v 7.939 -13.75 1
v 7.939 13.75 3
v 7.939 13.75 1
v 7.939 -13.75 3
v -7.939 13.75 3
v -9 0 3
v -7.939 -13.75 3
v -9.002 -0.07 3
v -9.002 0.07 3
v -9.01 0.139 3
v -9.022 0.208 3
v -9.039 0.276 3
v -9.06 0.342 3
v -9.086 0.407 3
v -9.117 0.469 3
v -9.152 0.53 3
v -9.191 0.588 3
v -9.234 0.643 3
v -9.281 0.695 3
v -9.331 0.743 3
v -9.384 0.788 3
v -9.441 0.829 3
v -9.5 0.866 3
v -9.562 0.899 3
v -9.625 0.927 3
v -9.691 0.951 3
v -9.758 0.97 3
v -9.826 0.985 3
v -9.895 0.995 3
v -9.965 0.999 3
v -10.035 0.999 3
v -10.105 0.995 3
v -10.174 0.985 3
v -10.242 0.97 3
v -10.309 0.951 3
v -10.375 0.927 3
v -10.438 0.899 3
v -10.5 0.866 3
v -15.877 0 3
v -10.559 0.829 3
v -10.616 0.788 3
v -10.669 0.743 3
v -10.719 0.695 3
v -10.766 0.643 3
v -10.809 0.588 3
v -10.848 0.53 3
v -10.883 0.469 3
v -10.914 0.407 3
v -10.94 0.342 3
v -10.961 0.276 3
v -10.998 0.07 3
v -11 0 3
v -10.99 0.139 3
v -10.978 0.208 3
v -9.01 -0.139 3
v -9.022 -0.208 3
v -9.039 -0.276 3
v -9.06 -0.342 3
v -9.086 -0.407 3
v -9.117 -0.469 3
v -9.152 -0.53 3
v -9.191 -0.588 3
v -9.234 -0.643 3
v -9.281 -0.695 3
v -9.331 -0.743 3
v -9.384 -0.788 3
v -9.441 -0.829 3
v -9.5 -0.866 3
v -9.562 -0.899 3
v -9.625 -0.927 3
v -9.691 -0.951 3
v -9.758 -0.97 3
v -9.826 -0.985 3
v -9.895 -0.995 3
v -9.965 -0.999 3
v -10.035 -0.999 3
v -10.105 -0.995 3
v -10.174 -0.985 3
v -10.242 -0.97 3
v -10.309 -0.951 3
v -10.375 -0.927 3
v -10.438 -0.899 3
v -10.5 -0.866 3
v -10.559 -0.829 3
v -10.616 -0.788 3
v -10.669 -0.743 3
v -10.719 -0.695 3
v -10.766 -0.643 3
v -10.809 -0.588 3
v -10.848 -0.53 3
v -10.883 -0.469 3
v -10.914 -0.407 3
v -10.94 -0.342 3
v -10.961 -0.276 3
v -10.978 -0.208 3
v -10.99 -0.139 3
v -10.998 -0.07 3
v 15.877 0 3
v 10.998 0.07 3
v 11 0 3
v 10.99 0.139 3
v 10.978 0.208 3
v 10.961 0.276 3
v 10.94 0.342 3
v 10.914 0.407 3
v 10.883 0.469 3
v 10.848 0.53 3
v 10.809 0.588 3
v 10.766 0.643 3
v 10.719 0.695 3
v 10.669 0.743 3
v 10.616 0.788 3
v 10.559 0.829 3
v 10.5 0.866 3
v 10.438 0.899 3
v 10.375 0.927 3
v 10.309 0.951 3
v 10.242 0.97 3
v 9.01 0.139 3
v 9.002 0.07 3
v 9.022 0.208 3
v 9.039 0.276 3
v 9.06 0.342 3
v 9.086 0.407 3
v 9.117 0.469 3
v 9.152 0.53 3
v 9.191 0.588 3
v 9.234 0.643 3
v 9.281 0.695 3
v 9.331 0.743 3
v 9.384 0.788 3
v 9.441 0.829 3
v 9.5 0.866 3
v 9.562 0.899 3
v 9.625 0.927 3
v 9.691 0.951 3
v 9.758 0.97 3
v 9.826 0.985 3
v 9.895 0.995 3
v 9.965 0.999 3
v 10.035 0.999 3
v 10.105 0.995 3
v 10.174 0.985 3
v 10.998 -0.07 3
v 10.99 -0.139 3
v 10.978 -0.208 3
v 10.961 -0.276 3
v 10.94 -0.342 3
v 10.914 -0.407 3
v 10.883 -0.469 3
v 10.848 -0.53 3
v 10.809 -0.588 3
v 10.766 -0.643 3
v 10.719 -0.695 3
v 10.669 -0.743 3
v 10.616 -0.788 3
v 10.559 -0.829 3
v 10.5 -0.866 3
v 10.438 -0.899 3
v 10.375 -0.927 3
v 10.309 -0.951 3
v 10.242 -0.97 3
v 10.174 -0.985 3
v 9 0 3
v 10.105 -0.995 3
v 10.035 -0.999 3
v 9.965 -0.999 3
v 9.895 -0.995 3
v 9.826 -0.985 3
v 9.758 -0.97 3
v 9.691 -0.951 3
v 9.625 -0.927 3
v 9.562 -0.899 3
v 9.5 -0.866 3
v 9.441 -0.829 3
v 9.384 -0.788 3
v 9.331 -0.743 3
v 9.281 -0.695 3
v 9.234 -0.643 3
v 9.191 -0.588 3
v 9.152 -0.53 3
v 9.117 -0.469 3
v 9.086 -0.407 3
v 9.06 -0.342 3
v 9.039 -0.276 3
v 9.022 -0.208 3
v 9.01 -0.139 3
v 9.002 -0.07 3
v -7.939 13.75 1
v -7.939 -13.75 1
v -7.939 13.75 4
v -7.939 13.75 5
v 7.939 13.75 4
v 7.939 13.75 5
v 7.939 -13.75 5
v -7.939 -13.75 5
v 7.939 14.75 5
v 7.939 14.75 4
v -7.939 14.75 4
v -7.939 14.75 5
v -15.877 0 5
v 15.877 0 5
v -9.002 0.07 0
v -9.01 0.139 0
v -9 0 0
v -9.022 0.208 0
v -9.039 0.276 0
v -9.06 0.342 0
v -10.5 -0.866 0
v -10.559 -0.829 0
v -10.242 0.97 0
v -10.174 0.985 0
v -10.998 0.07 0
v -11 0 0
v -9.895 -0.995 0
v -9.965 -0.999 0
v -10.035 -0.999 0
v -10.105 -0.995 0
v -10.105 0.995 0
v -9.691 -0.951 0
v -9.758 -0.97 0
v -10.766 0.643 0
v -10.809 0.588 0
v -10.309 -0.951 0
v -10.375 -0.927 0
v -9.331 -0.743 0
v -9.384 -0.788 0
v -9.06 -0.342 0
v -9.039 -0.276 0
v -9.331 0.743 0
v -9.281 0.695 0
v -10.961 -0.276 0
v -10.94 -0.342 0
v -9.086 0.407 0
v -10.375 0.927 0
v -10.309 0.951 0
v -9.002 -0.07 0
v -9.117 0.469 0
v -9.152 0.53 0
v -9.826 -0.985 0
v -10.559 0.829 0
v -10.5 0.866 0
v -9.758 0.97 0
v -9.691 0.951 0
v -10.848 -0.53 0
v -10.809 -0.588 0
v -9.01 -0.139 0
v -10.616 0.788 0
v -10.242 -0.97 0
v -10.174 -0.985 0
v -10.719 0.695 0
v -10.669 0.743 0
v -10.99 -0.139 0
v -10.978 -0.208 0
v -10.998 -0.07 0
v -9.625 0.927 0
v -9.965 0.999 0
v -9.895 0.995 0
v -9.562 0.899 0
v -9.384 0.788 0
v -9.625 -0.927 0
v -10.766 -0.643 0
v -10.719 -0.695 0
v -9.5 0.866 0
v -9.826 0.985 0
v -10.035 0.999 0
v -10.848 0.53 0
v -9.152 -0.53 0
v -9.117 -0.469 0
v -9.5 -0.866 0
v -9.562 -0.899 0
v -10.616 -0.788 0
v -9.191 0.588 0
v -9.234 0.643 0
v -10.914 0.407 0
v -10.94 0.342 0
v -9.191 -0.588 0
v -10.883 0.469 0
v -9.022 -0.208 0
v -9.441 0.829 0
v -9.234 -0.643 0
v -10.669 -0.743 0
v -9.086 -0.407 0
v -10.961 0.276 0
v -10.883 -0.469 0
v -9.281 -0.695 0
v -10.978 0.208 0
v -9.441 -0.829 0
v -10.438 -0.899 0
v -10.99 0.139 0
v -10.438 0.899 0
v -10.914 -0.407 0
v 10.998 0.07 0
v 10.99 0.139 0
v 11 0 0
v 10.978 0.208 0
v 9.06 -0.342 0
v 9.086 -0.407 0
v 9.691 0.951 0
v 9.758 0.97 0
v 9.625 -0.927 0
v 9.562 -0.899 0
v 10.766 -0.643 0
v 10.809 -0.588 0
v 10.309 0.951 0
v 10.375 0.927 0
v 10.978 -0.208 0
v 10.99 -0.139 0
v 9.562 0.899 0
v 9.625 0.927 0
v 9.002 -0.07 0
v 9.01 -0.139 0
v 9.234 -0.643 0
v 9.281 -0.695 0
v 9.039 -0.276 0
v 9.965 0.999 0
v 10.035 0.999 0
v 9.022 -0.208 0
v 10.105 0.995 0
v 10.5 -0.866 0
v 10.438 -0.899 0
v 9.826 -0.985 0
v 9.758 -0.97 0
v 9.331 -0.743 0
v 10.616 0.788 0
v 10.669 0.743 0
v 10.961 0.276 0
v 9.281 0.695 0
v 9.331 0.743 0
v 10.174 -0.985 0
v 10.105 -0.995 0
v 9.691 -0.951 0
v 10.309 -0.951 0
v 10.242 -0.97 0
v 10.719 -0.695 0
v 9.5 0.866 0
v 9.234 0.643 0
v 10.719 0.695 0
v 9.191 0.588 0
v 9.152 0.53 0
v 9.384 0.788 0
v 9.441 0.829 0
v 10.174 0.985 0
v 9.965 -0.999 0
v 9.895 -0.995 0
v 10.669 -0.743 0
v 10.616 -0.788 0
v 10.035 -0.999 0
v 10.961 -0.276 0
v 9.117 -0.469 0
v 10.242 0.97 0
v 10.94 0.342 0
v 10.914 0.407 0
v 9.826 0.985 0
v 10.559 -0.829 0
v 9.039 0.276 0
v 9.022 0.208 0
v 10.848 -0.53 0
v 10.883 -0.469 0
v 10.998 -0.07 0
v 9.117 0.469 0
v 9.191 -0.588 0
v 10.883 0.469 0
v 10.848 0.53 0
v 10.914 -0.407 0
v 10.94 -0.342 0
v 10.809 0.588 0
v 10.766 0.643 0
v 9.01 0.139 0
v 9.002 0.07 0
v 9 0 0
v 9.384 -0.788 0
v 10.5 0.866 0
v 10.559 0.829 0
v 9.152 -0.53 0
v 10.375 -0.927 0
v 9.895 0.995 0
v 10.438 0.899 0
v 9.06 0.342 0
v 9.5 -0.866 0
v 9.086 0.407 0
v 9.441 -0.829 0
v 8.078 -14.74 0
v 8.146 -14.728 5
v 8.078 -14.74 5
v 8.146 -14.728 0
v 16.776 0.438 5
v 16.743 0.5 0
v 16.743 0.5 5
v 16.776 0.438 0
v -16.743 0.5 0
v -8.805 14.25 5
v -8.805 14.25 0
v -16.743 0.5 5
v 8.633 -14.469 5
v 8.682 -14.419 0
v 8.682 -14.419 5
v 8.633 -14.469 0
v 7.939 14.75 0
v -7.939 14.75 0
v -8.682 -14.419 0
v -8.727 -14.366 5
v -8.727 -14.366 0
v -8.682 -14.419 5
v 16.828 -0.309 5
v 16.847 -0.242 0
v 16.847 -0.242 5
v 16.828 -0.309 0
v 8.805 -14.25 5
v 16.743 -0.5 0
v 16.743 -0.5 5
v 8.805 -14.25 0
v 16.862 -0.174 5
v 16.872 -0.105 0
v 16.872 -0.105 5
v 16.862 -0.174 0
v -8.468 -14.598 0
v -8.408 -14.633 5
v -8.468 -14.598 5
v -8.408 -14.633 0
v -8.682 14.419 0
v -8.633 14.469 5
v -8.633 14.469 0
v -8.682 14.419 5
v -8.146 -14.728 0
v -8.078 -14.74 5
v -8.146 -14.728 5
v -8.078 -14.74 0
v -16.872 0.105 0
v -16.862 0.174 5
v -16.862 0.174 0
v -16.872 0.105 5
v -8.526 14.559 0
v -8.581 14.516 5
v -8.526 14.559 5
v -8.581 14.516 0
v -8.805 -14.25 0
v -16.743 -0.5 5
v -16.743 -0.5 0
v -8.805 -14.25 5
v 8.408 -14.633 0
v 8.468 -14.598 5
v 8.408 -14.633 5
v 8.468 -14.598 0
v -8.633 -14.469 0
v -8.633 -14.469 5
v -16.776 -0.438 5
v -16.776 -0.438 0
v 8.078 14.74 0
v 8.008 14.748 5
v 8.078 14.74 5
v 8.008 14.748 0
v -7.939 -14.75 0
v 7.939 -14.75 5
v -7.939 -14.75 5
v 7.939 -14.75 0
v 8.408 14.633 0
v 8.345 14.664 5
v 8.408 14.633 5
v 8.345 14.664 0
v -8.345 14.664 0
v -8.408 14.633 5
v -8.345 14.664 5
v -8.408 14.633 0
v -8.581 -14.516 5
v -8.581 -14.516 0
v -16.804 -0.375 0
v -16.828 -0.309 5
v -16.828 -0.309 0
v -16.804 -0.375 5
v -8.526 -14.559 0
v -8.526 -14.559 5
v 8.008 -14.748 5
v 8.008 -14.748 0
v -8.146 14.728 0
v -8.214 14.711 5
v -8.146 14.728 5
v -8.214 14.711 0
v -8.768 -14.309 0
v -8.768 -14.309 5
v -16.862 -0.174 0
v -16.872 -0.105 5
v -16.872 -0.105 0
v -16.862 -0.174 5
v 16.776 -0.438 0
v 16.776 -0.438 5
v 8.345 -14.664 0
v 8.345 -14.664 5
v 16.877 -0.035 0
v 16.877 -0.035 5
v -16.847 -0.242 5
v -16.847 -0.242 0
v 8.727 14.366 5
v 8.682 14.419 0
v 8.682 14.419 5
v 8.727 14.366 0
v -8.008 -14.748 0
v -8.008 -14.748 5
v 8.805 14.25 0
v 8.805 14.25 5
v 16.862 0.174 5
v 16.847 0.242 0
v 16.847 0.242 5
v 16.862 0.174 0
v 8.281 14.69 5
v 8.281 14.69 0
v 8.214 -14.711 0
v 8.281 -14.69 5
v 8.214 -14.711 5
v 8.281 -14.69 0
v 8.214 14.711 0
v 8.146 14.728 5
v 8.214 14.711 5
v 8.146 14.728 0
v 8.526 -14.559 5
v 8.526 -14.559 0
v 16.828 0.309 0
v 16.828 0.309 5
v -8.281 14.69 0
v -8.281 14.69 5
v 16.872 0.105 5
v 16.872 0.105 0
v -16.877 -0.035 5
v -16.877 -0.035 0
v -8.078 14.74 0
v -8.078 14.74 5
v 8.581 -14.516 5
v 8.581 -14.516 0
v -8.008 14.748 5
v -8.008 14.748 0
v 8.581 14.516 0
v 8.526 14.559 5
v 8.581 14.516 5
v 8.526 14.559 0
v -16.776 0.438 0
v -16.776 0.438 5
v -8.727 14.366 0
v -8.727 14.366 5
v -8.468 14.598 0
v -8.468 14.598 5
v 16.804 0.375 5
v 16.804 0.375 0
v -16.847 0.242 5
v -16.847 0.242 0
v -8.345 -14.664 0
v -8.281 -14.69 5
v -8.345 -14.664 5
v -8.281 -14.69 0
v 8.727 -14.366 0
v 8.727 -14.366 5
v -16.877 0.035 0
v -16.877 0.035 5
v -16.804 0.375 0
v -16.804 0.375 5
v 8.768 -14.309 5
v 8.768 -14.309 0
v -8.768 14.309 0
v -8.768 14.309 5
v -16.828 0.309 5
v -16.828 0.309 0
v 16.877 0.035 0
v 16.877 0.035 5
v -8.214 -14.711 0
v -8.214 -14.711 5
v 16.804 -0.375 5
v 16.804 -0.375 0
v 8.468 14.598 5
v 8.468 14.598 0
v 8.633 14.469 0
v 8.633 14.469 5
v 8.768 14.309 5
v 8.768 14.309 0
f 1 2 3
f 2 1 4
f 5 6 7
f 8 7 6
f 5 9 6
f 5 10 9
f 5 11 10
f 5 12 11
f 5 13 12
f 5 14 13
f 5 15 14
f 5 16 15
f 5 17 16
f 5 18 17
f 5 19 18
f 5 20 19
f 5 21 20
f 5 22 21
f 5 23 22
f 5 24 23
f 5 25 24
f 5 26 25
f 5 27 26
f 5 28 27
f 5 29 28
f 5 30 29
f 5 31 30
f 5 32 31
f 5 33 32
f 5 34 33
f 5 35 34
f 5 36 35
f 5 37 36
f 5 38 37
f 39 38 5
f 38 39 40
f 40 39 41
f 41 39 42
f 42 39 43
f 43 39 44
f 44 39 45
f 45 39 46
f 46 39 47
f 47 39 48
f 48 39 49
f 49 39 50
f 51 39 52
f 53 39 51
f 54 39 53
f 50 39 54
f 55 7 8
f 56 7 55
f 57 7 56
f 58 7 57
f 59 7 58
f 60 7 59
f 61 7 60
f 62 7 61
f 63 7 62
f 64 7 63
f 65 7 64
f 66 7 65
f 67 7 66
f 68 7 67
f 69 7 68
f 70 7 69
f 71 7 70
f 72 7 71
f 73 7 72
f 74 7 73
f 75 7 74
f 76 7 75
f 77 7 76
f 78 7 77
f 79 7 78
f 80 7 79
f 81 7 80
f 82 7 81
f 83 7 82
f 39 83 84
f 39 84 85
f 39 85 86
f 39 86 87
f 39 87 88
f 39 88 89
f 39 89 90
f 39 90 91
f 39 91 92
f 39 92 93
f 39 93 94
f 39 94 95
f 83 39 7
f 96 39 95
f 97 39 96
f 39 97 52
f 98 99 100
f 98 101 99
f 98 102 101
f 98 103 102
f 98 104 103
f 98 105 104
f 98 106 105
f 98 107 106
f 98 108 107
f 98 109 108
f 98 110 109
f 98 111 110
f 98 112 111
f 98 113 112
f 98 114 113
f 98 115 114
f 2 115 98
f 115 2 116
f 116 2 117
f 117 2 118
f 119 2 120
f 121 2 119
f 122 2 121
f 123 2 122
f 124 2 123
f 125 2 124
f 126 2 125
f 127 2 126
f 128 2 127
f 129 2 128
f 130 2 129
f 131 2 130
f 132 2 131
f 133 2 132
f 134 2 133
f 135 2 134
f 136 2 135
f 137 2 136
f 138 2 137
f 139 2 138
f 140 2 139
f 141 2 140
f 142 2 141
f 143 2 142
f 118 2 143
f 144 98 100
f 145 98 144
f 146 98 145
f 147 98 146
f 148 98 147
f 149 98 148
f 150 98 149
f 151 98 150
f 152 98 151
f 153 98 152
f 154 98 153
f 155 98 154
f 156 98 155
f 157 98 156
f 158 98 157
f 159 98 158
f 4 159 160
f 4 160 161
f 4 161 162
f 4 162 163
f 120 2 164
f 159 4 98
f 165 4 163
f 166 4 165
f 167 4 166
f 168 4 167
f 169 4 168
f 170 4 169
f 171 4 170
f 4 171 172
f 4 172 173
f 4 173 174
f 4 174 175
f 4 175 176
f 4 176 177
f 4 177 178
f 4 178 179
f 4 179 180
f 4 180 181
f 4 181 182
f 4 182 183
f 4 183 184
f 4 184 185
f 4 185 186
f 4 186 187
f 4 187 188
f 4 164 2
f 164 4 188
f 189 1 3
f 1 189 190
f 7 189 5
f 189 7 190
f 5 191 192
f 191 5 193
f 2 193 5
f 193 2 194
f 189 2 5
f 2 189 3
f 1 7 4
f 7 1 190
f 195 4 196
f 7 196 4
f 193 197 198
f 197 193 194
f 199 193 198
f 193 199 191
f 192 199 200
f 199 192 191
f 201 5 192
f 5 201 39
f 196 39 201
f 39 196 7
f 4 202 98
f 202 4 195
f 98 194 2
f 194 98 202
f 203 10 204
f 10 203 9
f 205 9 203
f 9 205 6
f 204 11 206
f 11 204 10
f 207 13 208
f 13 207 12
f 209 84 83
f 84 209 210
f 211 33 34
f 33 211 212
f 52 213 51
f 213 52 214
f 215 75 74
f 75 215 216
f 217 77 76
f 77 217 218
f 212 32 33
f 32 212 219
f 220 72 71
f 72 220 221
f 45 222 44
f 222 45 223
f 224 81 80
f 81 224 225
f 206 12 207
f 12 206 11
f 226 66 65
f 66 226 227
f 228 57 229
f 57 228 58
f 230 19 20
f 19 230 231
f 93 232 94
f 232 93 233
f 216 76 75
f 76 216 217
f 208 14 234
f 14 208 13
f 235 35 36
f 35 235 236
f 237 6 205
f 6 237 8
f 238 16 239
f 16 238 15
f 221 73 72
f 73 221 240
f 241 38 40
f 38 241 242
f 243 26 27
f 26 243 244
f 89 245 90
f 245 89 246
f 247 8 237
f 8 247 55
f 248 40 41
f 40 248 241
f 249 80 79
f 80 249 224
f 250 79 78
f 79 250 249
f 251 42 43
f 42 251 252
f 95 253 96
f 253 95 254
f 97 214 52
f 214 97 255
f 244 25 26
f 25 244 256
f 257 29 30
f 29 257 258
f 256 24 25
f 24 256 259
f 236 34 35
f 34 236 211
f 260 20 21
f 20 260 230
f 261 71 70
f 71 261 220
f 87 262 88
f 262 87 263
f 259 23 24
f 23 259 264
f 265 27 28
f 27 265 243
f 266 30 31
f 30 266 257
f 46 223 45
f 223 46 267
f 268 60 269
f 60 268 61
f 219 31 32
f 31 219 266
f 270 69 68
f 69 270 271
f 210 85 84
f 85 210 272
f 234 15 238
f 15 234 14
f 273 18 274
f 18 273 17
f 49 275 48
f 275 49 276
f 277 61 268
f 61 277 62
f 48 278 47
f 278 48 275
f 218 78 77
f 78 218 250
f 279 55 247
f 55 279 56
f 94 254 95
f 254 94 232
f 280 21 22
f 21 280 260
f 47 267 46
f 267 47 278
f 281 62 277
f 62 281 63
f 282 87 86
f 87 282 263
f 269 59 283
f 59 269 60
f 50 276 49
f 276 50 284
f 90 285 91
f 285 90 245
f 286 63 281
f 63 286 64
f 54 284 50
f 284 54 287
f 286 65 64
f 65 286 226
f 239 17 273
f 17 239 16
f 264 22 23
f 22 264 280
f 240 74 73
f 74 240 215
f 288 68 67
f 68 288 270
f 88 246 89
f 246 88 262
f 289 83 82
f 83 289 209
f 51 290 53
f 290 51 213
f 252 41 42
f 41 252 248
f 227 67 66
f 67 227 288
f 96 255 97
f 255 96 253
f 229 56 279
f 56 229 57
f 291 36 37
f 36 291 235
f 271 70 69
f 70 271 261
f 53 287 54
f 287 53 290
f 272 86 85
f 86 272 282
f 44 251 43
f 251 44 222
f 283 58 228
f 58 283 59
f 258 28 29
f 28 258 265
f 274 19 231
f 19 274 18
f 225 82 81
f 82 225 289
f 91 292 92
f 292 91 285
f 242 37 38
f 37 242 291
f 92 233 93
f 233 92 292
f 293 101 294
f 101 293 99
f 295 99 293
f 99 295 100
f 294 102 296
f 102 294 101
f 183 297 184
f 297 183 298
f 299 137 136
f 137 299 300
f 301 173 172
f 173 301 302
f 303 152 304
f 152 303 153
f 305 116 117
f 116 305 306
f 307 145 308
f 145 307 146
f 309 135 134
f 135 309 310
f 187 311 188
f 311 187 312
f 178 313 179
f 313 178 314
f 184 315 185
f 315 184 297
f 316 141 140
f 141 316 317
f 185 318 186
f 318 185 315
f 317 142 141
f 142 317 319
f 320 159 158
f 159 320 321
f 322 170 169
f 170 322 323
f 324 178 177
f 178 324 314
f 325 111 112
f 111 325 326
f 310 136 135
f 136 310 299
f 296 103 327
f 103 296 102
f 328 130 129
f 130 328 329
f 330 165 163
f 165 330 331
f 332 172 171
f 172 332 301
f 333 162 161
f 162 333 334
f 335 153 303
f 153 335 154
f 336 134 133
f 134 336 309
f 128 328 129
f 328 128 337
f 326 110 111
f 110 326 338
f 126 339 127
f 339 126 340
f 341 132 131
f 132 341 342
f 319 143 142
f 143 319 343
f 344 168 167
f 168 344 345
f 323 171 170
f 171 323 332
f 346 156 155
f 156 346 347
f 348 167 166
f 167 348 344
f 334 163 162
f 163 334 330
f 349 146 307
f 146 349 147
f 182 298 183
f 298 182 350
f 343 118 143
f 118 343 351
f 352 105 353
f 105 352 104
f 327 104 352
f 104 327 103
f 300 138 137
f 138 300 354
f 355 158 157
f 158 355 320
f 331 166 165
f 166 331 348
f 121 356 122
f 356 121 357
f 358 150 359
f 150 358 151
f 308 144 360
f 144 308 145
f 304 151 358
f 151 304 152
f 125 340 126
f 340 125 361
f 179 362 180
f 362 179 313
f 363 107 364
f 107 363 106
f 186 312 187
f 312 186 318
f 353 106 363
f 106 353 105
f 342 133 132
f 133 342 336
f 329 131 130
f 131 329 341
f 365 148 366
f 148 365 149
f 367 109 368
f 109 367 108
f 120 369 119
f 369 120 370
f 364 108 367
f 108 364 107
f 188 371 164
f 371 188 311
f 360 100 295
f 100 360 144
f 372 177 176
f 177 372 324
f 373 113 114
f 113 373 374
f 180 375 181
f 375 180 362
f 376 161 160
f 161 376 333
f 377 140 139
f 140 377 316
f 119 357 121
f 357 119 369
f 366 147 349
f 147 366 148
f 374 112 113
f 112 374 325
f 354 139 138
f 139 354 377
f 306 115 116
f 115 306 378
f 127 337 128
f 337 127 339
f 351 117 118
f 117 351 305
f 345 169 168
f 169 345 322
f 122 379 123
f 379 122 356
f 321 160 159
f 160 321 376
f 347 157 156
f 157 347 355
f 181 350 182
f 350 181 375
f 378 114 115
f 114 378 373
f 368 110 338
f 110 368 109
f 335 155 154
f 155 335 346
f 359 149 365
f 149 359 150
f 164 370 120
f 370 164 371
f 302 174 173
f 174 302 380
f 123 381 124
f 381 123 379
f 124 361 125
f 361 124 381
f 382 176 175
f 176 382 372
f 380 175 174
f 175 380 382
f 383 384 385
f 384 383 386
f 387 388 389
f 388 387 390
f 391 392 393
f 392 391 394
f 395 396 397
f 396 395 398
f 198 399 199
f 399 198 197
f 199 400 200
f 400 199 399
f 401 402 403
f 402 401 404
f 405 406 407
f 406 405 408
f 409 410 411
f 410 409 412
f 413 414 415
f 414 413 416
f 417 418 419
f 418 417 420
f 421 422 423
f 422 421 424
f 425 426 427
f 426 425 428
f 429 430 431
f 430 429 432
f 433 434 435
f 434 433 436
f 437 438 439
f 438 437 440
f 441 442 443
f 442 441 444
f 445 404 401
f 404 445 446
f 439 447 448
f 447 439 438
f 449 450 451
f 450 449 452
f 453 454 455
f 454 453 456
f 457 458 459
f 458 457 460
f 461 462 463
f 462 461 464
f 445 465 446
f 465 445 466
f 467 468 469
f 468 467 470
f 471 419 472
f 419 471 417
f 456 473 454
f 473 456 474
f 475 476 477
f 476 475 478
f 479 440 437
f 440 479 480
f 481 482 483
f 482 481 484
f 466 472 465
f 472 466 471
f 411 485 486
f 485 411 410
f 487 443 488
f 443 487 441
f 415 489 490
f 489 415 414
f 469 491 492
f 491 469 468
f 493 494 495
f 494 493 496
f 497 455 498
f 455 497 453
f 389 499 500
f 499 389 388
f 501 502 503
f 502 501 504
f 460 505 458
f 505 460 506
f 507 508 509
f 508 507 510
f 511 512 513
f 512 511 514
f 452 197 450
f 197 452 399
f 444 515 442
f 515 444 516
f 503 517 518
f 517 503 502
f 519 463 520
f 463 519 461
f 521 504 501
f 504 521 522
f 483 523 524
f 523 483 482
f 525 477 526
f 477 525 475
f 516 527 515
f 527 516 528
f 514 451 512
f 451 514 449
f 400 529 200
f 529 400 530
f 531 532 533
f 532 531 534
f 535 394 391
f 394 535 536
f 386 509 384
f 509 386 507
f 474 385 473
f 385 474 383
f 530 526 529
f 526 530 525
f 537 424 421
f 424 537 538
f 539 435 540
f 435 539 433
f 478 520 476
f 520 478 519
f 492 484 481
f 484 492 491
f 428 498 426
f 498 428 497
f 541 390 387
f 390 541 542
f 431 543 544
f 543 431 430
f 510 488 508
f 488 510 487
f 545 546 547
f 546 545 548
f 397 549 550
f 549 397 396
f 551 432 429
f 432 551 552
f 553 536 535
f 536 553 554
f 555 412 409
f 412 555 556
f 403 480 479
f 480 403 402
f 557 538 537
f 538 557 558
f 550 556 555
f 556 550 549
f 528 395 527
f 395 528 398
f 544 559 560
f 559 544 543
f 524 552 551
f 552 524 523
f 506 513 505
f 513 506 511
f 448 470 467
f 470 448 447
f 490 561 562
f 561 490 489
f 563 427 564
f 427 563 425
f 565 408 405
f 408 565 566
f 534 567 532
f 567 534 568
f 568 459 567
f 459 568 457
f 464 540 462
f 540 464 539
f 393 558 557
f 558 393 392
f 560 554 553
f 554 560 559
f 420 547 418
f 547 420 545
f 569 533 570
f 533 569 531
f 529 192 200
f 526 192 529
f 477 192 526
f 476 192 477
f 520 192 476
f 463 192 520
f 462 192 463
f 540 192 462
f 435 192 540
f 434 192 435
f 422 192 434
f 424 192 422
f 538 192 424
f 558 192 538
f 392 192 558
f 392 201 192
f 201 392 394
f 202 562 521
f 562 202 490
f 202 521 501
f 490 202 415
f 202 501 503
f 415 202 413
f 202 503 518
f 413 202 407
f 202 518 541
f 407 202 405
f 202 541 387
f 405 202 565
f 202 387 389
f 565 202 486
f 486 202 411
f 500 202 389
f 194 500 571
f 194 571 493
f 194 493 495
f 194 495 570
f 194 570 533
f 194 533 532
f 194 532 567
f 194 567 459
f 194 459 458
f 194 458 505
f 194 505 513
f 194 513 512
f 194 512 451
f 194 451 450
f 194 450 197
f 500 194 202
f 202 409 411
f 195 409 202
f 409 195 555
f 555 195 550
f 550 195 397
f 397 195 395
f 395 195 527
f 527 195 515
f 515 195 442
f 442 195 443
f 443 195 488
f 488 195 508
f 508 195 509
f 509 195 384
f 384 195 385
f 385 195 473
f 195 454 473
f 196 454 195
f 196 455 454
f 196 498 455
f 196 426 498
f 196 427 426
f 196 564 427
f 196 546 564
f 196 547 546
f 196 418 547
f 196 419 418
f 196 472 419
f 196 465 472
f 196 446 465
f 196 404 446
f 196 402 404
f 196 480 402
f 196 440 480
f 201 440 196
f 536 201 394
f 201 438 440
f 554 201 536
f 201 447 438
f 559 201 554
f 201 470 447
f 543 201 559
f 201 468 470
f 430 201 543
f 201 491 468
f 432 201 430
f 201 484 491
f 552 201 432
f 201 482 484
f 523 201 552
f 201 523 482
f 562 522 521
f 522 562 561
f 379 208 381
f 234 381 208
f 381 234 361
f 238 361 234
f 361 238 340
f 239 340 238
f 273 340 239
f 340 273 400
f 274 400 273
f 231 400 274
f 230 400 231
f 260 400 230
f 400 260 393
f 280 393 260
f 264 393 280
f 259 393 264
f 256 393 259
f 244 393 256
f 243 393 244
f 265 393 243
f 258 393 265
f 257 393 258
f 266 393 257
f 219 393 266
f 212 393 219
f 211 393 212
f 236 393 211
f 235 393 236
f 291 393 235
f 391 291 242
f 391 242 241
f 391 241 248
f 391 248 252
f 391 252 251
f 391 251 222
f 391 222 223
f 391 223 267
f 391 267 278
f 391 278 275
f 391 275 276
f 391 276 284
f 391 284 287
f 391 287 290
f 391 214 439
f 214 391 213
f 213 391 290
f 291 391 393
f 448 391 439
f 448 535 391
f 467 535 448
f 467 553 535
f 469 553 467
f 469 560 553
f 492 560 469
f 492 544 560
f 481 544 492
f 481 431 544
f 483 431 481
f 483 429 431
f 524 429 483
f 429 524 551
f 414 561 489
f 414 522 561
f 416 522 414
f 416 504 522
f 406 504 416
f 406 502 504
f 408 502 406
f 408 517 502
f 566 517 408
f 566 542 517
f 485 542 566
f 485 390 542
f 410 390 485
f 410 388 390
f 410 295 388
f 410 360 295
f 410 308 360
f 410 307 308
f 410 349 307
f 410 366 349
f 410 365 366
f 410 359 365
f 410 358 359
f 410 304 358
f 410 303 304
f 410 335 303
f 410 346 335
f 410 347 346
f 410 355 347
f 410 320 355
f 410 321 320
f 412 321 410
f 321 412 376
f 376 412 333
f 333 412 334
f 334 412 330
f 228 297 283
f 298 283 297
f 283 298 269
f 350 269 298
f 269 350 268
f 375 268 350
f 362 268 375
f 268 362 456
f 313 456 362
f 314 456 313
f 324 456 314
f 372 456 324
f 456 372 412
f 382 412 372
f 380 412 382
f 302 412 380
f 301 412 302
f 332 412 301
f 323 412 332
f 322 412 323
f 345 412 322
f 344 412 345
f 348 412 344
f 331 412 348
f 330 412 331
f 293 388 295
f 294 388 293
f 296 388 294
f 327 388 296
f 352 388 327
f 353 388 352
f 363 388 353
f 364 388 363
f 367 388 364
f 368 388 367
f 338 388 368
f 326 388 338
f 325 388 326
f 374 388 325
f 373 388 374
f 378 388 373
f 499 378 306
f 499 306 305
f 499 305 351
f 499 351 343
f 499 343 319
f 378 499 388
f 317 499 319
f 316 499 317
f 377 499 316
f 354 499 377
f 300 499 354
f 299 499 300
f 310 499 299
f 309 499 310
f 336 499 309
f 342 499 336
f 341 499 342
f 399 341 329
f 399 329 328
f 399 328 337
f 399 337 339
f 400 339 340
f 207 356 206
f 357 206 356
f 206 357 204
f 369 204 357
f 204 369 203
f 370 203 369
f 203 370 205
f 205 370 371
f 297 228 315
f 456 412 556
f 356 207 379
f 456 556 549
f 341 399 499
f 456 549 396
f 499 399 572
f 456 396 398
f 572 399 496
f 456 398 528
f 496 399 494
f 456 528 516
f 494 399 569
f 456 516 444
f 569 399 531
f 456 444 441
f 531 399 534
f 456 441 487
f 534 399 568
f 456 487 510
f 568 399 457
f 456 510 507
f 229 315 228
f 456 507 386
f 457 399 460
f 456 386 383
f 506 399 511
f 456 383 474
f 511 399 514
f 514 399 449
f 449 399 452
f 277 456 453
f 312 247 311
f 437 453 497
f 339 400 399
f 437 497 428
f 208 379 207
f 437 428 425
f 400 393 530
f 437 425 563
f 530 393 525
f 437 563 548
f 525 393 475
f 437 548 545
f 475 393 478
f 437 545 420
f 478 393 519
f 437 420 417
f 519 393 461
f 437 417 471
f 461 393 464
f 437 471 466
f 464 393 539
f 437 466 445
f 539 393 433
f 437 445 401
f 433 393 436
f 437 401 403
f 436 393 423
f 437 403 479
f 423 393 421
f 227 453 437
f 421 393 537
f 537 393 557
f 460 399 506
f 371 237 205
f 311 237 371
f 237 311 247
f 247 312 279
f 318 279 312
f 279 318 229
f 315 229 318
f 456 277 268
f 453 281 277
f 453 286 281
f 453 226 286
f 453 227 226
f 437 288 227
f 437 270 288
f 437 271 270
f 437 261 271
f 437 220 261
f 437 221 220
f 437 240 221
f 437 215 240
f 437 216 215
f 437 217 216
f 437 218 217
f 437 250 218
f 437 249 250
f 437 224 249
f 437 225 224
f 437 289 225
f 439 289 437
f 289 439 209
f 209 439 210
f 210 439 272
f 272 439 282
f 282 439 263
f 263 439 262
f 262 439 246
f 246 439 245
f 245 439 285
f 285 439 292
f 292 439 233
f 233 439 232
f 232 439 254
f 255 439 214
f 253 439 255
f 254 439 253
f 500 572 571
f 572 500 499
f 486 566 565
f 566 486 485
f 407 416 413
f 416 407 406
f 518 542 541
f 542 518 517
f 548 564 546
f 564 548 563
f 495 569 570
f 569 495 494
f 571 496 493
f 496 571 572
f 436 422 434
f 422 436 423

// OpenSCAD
// zum module 1
// hexagonal module

$fn = 90;
drill = 2;

module holes() {
    d = 20;
    translate( [ -d/2, 0, -1 ] ) cylinder( d = drill, h = 11 );
    translate( [ d/2, 0, -1 ] ) cylinder( d = drill, h = 11 );
}

module hexagon( ) {
    h = 27.5;
    b = 27.5;
    
    intersection() {
        square( [ 100, h ], center = true );
        rotate( 60 ) square( [ 100, b ], center = true );
        rotate( -60 ) square( [ 100, b ], center = true );
    }
    
}

module zum_hexmodule_clearance( h = 27.5 ) {
    ri = h/2;
    ro = ri / ( 0.5 * sqrt(3) );
    translate( [ -ro/2, -ri, -2 ] ) cube( [ ro, ri * 2, 2 ] );
    translate( [ -ro/2, ri/2, 1 ] ) cube( [ ro, ri, 8 ] );
    
}

module zum_hexmodule() {
    difference() {
        linear_extrude( height = 5 ) offset( r = 1 ) hexagon();
        translate( [ 0, 0, 3 ] ) {
            linear_extrude( height = 5 ) hexagon();
            zum_hexmodule_clearance();
        }
        holes();
    }
}

zum_hexmodule();
